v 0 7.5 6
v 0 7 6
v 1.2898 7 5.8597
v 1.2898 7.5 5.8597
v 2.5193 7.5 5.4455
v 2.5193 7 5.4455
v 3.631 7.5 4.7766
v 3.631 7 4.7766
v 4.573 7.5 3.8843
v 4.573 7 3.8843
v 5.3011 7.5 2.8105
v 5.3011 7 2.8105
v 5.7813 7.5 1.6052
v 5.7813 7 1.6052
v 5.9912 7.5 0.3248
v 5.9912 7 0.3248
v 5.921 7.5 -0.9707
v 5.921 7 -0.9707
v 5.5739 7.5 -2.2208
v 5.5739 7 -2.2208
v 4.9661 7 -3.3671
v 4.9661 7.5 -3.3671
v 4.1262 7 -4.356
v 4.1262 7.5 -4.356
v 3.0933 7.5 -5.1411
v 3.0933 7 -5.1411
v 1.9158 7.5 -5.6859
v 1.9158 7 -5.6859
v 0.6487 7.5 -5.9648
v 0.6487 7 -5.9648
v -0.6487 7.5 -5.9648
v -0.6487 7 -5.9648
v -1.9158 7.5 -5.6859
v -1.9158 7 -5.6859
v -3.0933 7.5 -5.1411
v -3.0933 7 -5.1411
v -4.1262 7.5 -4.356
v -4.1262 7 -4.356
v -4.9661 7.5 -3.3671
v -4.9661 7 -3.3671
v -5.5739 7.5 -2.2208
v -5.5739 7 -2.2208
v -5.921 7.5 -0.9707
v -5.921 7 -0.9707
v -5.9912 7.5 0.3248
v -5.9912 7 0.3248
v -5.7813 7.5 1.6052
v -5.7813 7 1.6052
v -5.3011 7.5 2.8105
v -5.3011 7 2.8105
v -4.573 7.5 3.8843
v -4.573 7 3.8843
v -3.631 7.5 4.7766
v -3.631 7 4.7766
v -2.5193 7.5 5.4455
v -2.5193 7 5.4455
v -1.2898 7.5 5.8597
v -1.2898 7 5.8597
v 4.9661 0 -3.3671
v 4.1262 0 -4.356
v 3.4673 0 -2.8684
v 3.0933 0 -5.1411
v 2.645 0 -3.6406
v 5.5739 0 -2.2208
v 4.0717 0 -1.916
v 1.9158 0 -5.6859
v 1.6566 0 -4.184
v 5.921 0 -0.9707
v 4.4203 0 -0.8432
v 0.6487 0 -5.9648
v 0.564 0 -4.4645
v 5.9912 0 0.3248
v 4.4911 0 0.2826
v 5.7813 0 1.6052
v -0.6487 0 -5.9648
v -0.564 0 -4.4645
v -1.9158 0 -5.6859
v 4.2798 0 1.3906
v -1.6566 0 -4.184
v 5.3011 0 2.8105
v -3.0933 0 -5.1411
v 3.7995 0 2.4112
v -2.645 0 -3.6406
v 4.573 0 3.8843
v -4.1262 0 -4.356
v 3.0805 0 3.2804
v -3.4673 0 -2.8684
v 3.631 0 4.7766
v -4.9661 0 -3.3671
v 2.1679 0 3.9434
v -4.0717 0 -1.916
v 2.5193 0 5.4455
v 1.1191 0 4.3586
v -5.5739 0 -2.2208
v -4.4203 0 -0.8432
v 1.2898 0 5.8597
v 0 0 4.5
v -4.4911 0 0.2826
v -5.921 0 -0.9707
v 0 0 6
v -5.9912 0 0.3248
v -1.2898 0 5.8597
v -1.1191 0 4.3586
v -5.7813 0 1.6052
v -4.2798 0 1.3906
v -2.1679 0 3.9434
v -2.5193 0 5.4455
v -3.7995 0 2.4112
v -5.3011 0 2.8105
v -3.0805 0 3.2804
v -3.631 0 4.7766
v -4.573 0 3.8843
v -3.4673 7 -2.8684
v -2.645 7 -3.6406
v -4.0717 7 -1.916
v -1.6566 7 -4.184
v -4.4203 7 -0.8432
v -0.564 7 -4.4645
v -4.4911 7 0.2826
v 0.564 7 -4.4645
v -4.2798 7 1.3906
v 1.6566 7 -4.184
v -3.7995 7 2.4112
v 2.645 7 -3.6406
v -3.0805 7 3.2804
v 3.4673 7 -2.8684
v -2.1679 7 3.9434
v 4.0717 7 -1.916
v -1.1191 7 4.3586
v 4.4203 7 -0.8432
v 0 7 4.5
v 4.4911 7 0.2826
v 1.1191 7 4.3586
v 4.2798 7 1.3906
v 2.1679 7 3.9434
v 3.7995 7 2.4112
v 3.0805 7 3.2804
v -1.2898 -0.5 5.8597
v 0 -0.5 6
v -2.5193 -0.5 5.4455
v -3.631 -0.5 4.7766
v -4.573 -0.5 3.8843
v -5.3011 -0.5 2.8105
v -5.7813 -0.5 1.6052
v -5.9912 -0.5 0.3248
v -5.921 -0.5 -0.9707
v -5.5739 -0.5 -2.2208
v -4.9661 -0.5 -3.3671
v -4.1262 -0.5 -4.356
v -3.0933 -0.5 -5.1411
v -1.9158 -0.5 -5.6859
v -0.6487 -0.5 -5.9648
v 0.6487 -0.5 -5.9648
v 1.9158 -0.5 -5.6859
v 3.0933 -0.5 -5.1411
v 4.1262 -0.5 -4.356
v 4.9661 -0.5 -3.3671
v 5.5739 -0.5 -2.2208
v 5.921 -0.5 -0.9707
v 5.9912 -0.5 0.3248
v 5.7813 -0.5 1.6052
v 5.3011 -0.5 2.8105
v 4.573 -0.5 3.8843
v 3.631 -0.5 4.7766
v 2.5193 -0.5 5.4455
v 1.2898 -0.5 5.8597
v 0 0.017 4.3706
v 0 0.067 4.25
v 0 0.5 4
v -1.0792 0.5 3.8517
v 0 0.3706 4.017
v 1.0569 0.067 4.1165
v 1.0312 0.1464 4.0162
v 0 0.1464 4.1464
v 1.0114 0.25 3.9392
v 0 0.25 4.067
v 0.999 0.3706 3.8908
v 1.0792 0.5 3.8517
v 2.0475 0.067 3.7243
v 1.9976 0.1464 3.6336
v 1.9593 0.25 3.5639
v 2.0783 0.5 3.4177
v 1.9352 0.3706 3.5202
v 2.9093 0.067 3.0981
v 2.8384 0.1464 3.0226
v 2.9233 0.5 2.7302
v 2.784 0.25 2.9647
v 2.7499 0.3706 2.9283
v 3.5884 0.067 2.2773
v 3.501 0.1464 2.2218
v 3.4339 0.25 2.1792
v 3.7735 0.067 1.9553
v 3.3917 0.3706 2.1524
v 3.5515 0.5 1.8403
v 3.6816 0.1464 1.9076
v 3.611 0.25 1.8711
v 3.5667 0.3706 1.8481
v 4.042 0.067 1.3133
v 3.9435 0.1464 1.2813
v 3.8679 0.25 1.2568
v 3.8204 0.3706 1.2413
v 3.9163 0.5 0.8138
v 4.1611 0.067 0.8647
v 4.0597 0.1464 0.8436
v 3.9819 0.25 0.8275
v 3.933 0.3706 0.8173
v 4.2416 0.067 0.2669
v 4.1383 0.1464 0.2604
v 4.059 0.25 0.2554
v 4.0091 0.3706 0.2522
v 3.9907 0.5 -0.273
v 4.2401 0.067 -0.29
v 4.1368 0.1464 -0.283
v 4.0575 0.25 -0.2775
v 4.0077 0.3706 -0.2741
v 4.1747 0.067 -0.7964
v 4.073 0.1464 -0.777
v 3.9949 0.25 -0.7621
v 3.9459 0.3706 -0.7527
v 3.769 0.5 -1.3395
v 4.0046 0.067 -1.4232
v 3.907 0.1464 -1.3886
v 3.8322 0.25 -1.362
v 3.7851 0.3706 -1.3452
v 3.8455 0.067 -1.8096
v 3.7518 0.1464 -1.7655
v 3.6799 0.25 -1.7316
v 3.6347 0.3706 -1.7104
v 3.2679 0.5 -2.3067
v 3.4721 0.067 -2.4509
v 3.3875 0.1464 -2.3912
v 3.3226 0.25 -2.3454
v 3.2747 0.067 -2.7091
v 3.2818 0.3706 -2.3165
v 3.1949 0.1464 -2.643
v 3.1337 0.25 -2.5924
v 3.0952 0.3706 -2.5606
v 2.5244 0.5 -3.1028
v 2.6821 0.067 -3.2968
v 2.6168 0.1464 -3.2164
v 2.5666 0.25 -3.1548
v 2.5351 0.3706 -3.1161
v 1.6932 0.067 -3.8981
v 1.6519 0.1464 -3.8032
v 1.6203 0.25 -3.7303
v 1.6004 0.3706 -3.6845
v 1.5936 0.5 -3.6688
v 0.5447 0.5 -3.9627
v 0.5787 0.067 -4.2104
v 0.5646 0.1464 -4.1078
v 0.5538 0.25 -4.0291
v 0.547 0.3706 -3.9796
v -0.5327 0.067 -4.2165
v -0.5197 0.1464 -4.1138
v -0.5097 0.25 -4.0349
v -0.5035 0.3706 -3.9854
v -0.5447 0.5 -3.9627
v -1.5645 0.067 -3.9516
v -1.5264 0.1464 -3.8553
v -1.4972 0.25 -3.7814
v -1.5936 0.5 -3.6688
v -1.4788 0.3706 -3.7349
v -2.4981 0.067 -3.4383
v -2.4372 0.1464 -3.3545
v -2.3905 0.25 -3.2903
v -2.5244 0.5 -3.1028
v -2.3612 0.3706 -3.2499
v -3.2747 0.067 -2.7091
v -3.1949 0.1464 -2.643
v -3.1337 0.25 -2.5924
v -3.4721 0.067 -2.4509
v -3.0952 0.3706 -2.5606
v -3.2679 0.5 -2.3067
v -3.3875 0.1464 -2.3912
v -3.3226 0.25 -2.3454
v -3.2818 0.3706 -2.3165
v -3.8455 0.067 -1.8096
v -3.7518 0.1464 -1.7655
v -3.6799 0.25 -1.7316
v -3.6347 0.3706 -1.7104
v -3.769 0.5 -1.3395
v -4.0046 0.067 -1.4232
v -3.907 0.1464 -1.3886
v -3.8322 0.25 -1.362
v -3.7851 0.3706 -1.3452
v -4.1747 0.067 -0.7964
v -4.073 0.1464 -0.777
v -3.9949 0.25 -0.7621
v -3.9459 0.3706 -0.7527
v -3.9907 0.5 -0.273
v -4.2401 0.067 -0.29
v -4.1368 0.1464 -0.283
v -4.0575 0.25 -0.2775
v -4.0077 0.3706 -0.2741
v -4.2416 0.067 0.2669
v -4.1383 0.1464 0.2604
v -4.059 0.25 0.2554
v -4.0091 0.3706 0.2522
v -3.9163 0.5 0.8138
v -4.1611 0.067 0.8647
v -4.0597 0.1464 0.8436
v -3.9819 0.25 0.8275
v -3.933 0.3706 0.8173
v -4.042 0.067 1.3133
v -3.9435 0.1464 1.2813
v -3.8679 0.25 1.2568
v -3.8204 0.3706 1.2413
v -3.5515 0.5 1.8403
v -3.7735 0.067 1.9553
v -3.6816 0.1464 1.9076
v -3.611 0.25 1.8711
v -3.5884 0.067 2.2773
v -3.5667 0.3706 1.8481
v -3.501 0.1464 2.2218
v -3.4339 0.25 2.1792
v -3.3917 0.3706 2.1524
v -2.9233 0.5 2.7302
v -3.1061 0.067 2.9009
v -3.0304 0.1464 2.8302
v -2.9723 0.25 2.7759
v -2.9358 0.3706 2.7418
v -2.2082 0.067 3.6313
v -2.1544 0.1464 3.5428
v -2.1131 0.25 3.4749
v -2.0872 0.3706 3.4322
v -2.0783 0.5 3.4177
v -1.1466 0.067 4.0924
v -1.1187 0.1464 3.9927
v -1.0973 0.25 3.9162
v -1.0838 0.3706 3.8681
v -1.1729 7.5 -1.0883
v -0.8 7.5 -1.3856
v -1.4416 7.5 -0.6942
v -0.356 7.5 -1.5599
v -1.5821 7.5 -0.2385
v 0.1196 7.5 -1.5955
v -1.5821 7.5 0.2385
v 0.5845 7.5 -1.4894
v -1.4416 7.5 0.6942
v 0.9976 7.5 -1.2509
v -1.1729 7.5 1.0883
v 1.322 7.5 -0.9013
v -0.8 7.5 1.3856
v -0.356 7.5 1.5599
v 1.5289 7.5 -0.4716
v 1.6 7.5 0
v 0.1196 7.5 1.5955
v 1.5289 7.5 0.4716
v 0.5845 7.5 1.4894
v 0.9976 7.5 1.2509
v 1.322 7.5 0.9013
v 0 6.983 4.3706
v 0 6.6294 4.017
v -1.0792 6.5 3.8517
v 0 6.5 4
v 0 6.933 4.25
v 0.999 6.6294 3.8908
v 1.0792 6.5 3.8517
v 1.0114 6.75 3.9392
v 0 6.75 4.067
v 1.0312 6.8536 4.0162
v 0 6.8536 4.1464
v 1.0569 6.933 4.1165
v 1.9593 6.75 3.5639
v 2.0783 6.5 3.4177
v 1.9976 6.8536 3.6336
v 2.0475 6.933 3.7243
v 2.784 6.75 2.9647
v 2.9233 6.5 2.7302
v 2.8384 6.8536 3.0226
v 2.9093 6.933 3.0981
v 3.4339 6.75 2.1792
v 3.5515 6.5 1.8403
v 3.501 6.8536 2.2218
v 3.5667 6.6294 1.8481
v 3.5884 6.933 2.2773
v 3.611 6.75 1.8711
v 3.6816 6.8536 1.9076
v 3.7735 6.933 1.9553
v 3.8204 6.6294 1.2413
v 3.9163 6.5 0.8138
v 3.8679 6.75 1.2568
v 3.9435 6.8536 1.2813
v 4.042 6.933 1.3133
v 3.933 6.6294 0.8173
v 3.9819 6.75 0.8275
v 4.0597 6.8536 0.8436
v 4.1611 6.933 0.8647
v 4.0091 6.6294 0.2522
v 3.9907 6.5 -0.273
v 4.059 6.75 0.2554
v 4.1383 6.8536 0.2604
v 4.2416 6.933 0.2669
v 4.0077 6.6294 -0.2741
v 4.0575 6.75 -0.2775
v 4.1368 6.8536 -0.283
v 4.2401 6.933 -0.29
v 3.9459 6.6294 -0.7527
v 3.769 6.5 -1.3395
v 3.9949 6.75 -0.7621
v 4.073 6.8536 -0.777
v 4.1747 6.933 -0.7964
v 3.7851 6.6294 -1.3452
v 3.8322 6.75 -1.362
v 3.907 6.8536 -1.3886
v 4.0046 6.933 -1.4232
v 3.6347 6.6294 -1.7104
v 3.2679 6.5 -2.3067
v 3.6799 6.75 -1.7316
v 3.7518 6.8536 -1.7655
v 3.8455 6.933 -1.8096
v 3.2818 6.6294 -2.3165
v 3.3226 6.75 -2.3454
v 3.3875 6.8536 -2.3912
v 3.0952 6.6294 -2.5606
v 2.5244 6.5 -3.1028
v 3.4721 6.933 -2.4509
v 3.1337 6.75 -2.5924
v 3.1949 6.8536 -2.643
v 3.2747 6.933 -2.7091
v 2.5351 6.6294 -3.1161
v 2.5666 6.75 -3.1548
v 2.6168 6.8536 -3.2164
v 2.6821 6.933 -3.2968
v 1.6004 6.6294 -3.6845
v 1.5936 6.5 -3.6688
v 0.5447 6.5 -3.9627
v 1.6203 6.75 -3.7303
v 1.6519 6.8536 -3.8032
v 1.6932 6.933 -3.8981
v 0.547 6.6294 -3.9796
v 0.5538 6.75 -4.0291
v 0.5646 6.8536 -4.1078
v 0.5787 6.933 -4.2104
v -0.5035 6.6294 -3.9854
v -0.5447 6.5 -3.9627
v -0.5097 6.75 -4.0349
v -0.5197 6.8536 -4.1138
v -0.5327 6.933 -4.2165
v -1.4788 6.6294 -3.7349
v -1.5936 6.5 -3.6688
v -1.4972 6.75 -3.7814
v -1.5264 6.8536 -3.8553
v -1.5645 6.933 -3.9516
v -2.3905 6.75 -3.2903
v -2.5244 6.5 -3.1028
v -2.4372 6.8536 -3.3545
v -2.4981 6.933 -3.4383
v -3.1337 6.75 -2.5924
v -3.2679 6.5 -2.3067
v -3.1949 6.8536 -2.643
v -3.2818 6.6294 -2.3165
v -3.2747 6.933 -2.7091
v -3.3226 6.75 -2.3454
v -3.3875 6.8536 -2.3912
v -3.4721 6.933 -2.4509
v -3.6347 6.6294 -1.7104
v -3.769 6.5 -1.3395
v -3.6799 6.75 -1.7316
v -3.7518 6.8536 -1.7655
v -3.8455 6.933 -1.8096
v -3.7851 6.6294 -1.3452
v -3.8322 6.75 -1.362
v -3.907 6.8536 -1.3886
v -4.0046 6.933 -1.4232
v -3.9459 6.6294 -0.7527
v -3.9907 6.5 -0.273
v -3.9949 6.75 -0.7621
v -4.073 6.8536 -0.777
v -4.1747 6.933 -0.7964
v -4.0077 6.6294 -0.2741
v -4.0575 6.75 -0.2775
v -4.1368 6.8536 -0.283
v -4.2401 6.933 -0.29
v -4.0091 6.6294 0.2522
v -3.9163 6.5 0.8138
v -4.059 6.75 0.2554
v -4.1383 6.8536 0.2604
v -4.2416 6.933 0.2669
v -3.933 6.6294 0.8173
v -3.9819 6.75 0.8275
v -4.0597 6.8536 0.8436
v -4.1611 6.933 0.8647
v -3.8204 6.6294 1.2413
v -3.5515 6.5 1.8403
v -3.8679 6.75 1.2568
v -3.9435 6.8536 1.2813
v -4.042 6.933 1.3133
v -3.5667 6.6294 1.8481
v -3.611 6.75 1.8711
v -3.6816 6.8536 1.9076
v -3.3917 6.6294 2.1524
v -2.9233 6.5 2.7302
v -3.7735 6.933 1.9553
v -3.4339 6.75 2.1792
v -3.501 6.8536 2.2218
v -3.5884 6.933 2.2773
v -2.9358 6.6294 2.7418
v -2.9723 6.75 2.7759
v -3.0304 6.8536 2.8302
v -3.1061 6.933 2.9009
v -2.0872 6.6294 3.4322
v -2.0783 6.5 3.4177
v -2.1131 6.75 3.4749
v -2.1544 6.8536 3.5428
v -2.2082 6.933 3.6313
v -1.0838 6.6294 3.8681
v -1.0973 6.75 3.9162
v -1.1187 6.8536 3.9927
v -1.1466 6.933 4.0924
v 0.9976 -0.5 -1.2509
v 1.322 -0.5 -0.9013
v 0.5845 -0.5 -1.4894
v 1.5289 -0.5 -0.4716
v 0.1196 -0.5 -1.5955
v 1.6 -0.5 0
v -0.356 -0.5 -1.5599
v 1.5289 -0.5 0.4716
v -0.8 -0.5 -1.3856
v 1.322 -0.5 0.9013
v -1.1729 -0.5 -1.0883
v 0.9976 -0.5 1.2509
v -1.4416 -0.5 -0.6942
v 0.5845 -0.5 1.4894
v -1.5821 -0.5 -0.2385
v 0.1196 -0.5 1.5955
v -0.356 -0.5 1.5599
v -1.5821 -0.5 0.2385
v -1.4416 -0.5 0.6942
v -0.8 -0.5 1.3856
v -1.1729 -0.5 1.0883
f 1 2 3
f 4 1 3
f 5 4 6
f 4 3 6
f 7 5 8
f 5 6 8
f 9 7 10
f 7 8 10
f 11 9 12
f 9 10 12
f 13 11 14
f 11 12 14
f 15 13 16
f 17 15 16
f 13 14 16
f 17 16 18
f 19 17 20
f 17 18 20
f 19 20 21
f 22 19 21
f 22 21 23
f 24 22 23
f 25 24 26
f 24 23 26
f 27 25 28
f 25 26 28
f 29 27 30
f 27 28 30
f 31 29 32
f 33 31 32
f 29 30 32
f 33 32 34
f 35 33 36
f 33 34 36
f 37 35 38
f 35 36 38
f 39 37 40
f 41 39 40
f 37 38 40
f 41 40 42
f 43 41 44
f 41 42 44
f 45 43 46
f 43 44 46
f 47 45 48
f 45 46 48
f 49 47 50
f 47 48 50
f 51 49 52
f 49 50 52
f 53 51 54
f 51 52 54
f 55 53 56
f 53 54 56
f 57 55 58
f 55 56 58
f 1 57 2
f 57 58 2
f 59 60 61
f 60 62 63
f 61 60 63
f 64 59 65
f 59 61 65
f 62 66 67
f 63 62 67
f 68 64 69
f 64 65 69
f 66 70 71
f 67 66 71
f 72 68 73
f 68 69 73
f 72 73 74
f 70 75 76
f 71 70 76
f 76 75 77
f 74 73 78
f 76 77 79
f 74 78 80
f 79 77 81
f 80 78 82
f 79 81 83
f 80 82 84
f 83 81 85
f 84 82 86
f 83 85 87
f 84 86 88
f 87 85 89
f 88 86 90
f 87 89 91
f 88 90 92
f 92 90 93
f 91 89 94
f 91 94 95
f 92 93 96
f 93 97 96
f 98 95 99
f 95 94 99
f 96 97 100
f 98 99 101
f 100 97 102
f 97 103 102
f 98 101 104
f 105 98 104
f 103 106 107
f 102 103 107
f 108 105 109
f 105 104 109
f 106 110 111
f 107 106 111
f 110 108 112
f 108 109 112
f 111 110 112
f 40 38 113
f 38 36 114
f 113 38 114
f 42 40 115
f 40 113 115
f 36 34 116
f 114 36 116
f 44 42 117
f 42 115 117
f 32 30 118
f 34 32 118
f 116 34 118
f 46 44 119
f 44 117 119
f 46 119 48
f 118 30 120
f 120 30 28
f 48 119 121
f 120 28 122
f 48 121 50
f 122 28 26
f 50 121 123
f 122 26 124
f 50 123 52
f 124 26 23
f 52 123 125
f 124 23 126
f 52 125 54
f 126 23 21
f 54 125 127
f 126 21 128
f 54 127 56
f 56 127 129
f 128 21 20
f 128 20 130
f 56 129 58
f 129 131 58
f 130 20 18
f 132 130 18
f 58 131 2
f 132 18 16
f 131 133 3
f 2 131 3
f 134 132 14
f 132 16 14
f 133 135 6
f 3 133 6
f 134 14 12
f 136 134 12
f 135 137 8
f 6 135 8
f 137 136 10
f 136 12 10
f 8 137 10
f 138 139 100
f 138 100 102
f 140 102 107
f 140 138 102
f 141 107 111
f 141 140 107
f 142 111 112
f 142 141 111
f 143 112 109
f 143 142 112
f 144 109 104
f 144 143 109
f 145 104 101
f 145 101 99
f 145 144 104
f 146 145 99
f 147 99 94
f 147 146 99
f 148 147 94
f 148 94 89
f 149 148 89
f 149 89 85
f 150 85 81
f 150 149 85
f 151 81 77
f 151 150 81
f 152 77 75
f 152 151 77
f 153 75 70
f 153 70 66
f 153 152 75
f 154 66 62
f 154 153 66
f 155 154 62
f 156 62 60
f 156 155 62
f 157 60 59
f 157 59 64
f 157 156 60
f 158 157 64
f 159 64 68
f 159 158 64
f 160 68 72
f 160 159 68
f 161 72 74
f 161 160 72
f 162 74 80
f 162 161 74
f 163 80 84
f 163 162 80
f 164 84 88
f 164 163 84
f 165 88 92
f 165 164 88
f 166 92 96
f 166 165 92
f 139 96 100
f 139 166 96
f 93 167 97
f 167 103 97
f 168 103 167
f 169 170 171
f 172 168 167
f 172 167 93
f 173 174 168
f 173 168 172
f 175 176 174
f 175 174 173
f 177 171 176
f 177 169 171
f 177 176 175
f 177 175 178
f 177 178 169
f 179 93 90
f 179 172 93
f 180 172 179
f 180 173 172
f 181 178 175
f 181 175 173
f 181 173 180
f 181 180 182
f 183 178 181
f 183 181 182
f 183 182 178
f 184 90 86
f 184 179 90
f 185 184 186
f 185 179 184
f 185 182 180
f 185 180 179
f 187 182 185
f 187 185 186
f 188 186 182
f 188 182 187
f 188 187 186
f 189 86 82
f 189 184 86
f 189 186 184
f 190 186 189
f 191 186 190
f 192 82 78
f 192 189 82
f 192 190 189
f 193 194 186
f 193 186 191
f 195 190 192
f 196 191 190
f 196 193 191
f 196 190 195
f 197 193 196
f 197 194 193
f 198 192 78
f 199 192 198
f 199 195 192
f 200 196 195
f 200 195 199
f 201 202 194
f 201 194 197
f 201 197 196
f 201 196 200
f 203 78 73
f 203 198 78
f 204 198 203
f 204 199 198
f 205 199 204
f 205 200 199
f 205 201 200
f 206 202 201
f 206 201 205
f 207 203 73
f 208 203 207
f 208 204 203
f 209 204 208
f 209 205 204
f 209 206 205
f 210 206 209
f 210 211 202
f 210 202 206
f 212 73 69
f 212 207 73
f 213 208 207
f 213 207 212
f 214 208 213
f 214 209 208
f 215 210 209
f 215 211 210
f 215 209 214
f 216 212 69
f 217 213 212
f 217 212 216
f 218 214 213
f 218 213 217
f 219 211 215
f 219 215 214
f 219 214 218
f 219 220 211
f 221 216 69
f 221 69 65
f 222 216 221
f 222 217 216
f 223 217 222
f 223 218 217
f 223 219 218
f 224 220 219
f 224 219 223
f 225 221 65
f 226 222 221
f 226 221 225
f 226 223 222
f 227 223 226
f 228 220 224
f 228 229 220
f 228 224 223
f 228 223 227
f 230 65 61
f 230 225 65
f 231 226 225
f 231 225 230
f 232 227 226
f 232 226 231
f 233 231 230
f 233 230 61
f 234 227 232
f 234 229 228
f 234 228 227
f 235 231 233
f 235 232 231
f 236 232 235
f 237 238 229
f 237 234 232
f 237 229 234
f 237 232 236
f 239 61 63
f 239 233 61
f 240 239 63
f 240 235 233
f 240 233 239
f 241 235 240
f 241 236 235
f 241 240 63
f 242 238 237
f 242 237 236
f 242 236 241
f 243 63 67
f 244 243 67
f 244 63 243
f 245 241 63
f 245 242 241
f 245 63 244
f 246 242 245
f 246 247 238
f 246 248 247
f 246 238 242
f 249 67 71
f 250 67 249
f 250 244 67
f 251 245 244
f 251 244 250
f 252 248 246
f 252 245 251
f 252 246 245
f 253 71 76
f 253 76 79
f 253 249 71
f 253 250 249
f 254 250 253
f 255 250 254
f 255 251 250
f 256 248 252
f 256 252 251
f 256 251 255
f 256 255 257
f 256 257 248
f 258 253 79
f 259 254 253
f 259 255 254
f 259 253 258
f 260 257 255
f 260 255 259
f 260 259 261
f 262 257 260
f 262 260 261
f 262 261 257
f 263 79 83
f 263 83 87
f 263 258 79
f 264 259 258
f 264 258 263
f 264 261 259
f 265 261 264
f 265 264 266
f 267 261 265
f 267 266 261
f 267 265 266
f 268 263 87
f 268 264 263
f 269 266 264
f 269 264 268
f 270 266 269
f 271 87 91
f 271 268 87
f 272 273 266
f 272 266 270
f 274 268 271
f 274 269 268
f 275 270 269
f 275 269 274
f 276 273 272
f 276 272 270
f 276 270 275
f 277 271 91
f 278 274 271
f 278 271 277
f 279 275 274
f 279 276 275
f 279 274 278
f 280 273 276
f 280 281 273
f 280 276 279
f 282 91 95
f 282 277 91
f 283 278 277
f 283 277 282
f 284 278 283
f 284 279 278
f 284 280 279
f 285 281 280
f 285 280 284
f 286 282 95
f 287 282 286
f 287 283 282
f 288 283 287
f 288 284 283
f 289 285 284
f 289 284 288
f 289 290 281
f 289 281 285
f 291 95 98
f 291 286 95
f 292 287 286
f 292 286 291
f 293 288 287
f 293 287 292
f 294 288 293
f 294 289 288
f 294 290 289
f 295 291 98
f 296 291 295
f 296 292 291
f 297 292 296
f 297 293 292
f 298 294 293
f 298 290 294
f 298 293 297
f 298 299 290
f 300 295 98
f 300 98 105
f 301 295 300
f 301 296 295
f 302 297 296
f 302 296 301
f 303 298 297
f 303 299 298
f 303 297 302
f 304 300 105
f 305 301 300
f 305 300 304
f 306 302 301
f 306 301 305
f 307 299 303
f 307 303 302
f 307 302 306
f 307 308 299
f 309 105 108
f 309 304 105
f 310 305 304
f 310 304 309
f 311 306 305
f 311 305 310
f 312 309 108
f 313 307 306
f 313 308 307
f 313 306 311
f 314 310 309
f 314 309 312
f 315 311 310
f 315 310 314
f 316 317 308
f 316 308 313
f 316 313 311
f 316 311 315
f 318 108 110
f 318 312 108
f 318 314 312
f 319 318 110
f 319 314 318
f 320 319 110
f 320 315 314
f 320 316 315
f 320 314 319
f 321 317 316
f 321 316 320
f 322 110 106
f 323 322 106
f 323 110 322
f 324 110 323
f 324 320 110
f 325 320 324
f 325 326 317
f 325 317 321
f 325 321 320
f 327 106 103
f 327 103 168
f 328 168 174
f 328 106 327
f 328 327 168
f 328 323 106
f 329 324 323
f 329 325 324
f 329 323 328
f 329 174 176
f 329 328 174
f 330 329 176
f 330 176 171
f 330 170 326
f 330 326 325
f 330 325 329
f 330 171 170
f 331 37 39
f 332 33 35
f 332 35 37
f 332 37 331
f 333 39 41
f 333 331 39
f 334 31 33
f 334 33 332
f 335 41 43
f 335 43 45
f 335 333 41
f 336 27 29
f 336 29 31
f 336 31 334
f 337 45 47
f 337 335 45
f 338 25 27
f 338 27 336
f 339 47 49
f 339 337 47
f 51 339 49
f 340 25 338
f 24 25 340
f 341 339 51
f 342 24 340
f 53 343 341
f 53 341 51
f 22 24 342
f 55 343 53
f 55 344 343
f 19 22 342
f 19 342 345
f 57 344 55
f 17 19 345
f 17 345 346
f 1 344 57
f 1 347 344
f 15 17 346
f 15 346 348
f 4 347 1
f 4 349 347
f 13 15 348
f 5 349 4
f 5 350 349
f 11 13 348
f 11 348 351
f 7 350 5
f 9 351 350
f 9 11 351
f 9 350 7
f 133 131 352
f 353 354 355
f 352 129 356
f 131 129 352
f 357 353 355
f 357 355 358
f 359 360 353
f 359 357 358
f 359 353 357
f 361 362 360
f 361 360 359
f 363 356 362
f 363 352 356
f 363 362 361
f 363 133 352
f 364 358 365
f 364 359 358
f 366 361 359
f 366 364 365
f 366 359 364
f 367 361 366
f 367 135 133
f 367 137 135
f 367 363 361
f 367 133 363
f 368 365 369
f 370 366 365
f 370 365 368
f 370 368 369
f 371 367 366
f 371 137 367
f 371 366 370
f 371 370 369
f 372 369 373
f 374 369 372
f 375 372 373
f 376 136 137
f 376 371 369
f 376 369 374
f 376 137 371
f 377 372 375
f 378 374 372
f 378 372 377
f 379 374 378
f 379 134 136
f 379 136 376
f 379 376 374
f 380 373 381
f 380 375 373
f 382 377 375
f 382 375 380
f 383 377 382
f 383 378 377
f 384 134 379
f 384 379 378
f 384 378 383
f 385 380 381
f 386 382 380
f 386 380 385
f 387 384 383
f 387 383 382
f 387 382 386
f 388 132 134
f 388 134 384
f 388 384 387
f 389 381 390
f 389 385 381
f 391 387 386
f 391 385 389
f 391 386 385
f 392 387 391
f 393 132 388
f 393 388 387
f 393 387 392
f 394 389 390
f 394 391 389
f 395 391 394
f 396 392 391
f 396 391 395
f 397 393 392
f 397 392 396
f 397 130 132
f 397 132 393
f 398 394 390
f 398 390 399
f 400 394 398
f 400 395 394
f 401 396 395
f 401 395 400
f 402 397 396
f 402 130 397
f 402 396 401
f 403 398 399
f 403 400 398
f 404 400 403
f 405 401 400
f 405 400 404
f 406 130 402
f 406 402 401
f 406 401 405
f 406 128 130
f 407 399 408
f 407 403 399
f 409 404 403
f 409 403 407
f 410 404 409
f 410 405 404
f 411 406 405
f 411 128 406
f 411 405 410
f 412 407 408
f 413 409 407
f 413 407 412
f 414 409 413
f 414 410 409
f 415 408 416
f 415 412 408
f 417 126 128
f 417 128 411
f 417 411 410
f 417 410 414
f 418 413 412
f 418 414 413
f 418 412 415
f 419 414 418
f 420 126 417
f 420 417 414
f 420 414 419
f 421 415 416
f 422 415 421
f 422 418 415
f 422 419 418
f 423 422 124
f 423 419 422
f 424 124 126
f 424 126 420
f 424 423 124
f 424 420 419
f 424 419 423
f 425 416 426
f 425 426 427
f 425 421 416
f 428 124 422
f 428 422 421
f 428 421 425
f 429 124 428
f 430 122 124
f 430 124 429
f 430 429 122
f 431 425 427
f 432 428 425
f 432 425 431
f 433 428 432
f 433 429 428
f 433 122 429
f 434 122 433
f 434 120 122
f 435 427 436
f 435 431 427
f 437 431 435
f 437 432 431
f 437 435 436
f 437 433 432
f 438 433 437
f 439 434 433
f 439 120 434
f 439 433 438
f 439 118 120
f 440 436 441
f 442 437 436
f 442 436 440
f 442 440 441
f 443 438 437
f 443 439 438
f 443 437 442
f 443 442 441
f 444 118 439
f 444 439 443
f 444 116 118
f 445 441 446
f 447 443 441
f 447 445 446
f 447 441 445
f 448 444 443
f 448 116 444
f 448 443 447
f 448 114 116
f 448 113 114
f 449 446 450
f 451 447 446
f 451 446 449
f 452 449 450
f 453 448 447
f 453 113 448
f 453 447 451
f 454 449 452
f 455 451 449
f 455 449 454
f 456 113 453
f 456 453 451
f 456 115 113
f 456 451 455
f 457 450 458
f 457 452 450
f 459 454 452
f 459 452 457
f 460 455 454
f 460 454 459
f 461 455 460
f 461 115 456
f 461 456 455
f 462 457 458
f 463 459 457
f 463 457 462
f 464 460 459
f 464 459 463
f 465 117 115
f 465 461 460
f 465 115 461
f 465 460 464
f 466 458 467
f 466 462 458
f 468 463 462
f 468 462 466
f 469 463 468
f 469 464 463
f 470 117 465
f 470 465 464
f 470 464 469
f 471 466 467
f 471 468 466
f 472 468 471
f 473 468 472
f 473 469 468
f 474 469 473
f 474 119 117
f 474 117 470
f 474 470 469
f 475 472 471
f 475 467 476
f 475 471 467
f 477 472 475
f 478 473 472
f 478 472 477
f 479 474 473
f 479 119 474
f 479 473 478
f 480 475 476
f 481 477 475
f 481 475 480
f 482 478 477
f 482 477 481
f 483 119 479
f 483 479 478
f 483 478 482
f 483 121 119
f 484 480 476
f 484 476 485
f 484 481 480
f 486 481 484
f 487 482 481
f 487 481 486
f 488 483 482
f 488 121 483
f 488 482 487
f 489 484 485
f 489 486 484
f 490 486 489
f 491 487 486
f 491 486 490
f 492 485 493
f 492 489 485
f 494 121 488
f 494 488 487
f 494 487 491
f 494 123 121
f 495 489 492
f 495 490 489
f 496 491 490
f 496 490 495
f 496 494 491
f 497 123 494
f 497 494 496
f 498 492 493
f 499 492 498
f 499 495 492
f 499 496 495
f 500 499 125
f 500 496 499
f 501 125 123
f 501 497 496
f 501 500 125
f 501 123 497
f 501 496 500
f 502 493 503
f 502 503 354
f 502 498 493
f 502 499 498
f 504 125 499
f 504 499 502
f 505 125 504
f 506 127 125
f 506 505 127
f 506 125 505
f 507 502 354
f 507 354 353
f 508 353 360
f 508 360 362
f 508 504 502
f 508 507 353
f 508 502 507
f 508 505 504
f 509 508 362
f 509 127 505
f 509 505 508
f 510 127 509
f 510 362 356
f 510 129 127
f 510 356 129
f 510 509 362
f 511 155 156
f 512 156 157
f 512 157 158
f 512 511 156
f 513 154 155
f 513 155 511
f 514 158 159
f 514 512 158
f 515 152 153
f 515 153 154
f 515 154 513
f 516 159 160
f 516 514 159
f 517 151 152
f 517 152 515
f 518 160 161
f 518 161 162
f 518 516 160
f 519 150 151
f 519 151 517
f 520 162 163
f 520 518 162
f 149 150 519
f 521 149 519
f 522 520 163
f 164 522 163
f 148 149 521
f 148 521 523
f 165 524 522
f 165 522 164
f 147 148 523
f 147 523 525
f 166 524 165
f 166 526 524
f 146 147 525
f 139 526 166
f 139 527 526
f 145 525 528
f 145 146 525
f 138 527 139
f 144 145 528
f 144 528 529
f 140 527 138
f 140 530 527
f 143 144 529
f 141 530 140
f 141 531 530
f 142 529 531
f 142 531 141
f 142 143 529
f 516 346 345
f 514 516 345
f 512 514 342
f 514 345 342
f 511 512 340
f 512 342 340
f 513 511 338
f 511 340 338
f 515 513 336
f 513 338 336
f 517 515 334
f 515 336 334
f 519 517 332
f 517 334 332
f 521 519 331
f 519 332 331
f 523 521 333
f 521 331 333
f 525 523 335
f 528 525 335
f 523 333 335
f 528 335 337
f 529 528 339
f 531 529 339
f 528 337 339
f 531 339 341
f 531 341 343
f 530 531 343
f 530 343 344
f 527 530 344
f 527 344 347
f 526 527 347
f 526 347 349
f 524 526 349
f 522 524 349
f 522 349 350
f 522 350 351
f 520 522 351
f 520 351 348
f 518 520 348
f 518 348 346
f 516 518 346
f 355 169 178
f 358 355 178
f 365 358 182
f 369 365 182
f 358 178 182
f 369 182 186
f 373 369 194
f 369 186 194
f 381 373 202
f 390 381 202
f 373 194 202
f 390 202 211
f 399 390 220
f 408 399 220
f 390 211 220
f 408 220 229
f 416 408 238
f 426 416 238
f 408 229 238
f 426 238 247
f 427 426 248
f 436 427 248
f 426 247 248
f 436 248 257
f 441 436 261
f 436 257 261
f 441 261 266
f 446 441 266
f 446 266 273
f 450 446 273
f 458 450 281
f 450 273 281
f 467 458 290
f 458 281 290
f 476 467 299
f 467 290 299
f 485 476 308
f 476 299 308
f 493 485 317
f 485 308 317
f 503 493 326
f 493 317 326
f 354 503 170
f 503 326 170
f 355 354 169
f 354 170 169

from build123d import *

# Parameters (mm, degrees)
SKETCH1_R            = 4
BOSS_EXTRUDE1_DEPTH  = 7
SKETCH2_R            = 6
BOSS_EXTRUDE2_DEPTH  = 0.5
BOSS_EXTRUDE3_START  = 0.5
SKETCH3_R            = 6
BOSS_EXTRUDE3_DEPTH  = 0.5
M3_CLEARANCE_HOLE1_D = 3.2
FILLET1_R            = 0.5


with BuildPart() as part:
    # Sketch1 → Boss-Extrude1 (new body)
    with BuildSketch(Plane(origin=(0, 0, 0), x_dir=(1, 0, 0), z_dir=(0, 1, 0))):
        with Locations(Location((0, 0, 0), (0, 0, 270))):
            Circle(SKETCH1_R)
    extrude(amount=BOSS_EXTRUDE1_DEPTH)

    # Sketch2 → Boss-Extrude2 (add)
    with BuildSketch(Plane(origin=(0, 7, 0), x_dir=(1, 0, 0), z_dir=(0, 1, 0))):
        with Locations(Location((0, 0, 0), (0, 0, 270))):
            Circle(SKETCH2_R)
    extrude(amount=BOSS_EXTRUDE2_DEPTH)

    # Sketch3 → Boss-Extrude3 (add)
    with BuildSketch(Plane.XZ.offset(BOSS_EXTRUDE3_START)):
        with Locations(Location((0, 0, 0), (0, 0, 90))):
            Circle(SKETCH3_R)
    extrude(amount=-BOSS_EXTRUDE3_DEPTH)

    # M3 Clearance Hole1 (through all)
    with Locations(Plane(origin=(0, -0.5, 0), x_dir=(-1, 0, 0), z_dir=(0, -1, 0))):
        with Locations((0, 0)):
            Hole(M3_CLEARANCE_HOLE1_D / 2)

    # Fillet1
    fillet1_edges = [part.edges().sort_by_distance(p)[0] for p in [
        (0, 7, -4),
        (0, 0, -4),
    ]]
    fillet(fillet1_edges, radius=FILLET1_R)


solid = part.part
